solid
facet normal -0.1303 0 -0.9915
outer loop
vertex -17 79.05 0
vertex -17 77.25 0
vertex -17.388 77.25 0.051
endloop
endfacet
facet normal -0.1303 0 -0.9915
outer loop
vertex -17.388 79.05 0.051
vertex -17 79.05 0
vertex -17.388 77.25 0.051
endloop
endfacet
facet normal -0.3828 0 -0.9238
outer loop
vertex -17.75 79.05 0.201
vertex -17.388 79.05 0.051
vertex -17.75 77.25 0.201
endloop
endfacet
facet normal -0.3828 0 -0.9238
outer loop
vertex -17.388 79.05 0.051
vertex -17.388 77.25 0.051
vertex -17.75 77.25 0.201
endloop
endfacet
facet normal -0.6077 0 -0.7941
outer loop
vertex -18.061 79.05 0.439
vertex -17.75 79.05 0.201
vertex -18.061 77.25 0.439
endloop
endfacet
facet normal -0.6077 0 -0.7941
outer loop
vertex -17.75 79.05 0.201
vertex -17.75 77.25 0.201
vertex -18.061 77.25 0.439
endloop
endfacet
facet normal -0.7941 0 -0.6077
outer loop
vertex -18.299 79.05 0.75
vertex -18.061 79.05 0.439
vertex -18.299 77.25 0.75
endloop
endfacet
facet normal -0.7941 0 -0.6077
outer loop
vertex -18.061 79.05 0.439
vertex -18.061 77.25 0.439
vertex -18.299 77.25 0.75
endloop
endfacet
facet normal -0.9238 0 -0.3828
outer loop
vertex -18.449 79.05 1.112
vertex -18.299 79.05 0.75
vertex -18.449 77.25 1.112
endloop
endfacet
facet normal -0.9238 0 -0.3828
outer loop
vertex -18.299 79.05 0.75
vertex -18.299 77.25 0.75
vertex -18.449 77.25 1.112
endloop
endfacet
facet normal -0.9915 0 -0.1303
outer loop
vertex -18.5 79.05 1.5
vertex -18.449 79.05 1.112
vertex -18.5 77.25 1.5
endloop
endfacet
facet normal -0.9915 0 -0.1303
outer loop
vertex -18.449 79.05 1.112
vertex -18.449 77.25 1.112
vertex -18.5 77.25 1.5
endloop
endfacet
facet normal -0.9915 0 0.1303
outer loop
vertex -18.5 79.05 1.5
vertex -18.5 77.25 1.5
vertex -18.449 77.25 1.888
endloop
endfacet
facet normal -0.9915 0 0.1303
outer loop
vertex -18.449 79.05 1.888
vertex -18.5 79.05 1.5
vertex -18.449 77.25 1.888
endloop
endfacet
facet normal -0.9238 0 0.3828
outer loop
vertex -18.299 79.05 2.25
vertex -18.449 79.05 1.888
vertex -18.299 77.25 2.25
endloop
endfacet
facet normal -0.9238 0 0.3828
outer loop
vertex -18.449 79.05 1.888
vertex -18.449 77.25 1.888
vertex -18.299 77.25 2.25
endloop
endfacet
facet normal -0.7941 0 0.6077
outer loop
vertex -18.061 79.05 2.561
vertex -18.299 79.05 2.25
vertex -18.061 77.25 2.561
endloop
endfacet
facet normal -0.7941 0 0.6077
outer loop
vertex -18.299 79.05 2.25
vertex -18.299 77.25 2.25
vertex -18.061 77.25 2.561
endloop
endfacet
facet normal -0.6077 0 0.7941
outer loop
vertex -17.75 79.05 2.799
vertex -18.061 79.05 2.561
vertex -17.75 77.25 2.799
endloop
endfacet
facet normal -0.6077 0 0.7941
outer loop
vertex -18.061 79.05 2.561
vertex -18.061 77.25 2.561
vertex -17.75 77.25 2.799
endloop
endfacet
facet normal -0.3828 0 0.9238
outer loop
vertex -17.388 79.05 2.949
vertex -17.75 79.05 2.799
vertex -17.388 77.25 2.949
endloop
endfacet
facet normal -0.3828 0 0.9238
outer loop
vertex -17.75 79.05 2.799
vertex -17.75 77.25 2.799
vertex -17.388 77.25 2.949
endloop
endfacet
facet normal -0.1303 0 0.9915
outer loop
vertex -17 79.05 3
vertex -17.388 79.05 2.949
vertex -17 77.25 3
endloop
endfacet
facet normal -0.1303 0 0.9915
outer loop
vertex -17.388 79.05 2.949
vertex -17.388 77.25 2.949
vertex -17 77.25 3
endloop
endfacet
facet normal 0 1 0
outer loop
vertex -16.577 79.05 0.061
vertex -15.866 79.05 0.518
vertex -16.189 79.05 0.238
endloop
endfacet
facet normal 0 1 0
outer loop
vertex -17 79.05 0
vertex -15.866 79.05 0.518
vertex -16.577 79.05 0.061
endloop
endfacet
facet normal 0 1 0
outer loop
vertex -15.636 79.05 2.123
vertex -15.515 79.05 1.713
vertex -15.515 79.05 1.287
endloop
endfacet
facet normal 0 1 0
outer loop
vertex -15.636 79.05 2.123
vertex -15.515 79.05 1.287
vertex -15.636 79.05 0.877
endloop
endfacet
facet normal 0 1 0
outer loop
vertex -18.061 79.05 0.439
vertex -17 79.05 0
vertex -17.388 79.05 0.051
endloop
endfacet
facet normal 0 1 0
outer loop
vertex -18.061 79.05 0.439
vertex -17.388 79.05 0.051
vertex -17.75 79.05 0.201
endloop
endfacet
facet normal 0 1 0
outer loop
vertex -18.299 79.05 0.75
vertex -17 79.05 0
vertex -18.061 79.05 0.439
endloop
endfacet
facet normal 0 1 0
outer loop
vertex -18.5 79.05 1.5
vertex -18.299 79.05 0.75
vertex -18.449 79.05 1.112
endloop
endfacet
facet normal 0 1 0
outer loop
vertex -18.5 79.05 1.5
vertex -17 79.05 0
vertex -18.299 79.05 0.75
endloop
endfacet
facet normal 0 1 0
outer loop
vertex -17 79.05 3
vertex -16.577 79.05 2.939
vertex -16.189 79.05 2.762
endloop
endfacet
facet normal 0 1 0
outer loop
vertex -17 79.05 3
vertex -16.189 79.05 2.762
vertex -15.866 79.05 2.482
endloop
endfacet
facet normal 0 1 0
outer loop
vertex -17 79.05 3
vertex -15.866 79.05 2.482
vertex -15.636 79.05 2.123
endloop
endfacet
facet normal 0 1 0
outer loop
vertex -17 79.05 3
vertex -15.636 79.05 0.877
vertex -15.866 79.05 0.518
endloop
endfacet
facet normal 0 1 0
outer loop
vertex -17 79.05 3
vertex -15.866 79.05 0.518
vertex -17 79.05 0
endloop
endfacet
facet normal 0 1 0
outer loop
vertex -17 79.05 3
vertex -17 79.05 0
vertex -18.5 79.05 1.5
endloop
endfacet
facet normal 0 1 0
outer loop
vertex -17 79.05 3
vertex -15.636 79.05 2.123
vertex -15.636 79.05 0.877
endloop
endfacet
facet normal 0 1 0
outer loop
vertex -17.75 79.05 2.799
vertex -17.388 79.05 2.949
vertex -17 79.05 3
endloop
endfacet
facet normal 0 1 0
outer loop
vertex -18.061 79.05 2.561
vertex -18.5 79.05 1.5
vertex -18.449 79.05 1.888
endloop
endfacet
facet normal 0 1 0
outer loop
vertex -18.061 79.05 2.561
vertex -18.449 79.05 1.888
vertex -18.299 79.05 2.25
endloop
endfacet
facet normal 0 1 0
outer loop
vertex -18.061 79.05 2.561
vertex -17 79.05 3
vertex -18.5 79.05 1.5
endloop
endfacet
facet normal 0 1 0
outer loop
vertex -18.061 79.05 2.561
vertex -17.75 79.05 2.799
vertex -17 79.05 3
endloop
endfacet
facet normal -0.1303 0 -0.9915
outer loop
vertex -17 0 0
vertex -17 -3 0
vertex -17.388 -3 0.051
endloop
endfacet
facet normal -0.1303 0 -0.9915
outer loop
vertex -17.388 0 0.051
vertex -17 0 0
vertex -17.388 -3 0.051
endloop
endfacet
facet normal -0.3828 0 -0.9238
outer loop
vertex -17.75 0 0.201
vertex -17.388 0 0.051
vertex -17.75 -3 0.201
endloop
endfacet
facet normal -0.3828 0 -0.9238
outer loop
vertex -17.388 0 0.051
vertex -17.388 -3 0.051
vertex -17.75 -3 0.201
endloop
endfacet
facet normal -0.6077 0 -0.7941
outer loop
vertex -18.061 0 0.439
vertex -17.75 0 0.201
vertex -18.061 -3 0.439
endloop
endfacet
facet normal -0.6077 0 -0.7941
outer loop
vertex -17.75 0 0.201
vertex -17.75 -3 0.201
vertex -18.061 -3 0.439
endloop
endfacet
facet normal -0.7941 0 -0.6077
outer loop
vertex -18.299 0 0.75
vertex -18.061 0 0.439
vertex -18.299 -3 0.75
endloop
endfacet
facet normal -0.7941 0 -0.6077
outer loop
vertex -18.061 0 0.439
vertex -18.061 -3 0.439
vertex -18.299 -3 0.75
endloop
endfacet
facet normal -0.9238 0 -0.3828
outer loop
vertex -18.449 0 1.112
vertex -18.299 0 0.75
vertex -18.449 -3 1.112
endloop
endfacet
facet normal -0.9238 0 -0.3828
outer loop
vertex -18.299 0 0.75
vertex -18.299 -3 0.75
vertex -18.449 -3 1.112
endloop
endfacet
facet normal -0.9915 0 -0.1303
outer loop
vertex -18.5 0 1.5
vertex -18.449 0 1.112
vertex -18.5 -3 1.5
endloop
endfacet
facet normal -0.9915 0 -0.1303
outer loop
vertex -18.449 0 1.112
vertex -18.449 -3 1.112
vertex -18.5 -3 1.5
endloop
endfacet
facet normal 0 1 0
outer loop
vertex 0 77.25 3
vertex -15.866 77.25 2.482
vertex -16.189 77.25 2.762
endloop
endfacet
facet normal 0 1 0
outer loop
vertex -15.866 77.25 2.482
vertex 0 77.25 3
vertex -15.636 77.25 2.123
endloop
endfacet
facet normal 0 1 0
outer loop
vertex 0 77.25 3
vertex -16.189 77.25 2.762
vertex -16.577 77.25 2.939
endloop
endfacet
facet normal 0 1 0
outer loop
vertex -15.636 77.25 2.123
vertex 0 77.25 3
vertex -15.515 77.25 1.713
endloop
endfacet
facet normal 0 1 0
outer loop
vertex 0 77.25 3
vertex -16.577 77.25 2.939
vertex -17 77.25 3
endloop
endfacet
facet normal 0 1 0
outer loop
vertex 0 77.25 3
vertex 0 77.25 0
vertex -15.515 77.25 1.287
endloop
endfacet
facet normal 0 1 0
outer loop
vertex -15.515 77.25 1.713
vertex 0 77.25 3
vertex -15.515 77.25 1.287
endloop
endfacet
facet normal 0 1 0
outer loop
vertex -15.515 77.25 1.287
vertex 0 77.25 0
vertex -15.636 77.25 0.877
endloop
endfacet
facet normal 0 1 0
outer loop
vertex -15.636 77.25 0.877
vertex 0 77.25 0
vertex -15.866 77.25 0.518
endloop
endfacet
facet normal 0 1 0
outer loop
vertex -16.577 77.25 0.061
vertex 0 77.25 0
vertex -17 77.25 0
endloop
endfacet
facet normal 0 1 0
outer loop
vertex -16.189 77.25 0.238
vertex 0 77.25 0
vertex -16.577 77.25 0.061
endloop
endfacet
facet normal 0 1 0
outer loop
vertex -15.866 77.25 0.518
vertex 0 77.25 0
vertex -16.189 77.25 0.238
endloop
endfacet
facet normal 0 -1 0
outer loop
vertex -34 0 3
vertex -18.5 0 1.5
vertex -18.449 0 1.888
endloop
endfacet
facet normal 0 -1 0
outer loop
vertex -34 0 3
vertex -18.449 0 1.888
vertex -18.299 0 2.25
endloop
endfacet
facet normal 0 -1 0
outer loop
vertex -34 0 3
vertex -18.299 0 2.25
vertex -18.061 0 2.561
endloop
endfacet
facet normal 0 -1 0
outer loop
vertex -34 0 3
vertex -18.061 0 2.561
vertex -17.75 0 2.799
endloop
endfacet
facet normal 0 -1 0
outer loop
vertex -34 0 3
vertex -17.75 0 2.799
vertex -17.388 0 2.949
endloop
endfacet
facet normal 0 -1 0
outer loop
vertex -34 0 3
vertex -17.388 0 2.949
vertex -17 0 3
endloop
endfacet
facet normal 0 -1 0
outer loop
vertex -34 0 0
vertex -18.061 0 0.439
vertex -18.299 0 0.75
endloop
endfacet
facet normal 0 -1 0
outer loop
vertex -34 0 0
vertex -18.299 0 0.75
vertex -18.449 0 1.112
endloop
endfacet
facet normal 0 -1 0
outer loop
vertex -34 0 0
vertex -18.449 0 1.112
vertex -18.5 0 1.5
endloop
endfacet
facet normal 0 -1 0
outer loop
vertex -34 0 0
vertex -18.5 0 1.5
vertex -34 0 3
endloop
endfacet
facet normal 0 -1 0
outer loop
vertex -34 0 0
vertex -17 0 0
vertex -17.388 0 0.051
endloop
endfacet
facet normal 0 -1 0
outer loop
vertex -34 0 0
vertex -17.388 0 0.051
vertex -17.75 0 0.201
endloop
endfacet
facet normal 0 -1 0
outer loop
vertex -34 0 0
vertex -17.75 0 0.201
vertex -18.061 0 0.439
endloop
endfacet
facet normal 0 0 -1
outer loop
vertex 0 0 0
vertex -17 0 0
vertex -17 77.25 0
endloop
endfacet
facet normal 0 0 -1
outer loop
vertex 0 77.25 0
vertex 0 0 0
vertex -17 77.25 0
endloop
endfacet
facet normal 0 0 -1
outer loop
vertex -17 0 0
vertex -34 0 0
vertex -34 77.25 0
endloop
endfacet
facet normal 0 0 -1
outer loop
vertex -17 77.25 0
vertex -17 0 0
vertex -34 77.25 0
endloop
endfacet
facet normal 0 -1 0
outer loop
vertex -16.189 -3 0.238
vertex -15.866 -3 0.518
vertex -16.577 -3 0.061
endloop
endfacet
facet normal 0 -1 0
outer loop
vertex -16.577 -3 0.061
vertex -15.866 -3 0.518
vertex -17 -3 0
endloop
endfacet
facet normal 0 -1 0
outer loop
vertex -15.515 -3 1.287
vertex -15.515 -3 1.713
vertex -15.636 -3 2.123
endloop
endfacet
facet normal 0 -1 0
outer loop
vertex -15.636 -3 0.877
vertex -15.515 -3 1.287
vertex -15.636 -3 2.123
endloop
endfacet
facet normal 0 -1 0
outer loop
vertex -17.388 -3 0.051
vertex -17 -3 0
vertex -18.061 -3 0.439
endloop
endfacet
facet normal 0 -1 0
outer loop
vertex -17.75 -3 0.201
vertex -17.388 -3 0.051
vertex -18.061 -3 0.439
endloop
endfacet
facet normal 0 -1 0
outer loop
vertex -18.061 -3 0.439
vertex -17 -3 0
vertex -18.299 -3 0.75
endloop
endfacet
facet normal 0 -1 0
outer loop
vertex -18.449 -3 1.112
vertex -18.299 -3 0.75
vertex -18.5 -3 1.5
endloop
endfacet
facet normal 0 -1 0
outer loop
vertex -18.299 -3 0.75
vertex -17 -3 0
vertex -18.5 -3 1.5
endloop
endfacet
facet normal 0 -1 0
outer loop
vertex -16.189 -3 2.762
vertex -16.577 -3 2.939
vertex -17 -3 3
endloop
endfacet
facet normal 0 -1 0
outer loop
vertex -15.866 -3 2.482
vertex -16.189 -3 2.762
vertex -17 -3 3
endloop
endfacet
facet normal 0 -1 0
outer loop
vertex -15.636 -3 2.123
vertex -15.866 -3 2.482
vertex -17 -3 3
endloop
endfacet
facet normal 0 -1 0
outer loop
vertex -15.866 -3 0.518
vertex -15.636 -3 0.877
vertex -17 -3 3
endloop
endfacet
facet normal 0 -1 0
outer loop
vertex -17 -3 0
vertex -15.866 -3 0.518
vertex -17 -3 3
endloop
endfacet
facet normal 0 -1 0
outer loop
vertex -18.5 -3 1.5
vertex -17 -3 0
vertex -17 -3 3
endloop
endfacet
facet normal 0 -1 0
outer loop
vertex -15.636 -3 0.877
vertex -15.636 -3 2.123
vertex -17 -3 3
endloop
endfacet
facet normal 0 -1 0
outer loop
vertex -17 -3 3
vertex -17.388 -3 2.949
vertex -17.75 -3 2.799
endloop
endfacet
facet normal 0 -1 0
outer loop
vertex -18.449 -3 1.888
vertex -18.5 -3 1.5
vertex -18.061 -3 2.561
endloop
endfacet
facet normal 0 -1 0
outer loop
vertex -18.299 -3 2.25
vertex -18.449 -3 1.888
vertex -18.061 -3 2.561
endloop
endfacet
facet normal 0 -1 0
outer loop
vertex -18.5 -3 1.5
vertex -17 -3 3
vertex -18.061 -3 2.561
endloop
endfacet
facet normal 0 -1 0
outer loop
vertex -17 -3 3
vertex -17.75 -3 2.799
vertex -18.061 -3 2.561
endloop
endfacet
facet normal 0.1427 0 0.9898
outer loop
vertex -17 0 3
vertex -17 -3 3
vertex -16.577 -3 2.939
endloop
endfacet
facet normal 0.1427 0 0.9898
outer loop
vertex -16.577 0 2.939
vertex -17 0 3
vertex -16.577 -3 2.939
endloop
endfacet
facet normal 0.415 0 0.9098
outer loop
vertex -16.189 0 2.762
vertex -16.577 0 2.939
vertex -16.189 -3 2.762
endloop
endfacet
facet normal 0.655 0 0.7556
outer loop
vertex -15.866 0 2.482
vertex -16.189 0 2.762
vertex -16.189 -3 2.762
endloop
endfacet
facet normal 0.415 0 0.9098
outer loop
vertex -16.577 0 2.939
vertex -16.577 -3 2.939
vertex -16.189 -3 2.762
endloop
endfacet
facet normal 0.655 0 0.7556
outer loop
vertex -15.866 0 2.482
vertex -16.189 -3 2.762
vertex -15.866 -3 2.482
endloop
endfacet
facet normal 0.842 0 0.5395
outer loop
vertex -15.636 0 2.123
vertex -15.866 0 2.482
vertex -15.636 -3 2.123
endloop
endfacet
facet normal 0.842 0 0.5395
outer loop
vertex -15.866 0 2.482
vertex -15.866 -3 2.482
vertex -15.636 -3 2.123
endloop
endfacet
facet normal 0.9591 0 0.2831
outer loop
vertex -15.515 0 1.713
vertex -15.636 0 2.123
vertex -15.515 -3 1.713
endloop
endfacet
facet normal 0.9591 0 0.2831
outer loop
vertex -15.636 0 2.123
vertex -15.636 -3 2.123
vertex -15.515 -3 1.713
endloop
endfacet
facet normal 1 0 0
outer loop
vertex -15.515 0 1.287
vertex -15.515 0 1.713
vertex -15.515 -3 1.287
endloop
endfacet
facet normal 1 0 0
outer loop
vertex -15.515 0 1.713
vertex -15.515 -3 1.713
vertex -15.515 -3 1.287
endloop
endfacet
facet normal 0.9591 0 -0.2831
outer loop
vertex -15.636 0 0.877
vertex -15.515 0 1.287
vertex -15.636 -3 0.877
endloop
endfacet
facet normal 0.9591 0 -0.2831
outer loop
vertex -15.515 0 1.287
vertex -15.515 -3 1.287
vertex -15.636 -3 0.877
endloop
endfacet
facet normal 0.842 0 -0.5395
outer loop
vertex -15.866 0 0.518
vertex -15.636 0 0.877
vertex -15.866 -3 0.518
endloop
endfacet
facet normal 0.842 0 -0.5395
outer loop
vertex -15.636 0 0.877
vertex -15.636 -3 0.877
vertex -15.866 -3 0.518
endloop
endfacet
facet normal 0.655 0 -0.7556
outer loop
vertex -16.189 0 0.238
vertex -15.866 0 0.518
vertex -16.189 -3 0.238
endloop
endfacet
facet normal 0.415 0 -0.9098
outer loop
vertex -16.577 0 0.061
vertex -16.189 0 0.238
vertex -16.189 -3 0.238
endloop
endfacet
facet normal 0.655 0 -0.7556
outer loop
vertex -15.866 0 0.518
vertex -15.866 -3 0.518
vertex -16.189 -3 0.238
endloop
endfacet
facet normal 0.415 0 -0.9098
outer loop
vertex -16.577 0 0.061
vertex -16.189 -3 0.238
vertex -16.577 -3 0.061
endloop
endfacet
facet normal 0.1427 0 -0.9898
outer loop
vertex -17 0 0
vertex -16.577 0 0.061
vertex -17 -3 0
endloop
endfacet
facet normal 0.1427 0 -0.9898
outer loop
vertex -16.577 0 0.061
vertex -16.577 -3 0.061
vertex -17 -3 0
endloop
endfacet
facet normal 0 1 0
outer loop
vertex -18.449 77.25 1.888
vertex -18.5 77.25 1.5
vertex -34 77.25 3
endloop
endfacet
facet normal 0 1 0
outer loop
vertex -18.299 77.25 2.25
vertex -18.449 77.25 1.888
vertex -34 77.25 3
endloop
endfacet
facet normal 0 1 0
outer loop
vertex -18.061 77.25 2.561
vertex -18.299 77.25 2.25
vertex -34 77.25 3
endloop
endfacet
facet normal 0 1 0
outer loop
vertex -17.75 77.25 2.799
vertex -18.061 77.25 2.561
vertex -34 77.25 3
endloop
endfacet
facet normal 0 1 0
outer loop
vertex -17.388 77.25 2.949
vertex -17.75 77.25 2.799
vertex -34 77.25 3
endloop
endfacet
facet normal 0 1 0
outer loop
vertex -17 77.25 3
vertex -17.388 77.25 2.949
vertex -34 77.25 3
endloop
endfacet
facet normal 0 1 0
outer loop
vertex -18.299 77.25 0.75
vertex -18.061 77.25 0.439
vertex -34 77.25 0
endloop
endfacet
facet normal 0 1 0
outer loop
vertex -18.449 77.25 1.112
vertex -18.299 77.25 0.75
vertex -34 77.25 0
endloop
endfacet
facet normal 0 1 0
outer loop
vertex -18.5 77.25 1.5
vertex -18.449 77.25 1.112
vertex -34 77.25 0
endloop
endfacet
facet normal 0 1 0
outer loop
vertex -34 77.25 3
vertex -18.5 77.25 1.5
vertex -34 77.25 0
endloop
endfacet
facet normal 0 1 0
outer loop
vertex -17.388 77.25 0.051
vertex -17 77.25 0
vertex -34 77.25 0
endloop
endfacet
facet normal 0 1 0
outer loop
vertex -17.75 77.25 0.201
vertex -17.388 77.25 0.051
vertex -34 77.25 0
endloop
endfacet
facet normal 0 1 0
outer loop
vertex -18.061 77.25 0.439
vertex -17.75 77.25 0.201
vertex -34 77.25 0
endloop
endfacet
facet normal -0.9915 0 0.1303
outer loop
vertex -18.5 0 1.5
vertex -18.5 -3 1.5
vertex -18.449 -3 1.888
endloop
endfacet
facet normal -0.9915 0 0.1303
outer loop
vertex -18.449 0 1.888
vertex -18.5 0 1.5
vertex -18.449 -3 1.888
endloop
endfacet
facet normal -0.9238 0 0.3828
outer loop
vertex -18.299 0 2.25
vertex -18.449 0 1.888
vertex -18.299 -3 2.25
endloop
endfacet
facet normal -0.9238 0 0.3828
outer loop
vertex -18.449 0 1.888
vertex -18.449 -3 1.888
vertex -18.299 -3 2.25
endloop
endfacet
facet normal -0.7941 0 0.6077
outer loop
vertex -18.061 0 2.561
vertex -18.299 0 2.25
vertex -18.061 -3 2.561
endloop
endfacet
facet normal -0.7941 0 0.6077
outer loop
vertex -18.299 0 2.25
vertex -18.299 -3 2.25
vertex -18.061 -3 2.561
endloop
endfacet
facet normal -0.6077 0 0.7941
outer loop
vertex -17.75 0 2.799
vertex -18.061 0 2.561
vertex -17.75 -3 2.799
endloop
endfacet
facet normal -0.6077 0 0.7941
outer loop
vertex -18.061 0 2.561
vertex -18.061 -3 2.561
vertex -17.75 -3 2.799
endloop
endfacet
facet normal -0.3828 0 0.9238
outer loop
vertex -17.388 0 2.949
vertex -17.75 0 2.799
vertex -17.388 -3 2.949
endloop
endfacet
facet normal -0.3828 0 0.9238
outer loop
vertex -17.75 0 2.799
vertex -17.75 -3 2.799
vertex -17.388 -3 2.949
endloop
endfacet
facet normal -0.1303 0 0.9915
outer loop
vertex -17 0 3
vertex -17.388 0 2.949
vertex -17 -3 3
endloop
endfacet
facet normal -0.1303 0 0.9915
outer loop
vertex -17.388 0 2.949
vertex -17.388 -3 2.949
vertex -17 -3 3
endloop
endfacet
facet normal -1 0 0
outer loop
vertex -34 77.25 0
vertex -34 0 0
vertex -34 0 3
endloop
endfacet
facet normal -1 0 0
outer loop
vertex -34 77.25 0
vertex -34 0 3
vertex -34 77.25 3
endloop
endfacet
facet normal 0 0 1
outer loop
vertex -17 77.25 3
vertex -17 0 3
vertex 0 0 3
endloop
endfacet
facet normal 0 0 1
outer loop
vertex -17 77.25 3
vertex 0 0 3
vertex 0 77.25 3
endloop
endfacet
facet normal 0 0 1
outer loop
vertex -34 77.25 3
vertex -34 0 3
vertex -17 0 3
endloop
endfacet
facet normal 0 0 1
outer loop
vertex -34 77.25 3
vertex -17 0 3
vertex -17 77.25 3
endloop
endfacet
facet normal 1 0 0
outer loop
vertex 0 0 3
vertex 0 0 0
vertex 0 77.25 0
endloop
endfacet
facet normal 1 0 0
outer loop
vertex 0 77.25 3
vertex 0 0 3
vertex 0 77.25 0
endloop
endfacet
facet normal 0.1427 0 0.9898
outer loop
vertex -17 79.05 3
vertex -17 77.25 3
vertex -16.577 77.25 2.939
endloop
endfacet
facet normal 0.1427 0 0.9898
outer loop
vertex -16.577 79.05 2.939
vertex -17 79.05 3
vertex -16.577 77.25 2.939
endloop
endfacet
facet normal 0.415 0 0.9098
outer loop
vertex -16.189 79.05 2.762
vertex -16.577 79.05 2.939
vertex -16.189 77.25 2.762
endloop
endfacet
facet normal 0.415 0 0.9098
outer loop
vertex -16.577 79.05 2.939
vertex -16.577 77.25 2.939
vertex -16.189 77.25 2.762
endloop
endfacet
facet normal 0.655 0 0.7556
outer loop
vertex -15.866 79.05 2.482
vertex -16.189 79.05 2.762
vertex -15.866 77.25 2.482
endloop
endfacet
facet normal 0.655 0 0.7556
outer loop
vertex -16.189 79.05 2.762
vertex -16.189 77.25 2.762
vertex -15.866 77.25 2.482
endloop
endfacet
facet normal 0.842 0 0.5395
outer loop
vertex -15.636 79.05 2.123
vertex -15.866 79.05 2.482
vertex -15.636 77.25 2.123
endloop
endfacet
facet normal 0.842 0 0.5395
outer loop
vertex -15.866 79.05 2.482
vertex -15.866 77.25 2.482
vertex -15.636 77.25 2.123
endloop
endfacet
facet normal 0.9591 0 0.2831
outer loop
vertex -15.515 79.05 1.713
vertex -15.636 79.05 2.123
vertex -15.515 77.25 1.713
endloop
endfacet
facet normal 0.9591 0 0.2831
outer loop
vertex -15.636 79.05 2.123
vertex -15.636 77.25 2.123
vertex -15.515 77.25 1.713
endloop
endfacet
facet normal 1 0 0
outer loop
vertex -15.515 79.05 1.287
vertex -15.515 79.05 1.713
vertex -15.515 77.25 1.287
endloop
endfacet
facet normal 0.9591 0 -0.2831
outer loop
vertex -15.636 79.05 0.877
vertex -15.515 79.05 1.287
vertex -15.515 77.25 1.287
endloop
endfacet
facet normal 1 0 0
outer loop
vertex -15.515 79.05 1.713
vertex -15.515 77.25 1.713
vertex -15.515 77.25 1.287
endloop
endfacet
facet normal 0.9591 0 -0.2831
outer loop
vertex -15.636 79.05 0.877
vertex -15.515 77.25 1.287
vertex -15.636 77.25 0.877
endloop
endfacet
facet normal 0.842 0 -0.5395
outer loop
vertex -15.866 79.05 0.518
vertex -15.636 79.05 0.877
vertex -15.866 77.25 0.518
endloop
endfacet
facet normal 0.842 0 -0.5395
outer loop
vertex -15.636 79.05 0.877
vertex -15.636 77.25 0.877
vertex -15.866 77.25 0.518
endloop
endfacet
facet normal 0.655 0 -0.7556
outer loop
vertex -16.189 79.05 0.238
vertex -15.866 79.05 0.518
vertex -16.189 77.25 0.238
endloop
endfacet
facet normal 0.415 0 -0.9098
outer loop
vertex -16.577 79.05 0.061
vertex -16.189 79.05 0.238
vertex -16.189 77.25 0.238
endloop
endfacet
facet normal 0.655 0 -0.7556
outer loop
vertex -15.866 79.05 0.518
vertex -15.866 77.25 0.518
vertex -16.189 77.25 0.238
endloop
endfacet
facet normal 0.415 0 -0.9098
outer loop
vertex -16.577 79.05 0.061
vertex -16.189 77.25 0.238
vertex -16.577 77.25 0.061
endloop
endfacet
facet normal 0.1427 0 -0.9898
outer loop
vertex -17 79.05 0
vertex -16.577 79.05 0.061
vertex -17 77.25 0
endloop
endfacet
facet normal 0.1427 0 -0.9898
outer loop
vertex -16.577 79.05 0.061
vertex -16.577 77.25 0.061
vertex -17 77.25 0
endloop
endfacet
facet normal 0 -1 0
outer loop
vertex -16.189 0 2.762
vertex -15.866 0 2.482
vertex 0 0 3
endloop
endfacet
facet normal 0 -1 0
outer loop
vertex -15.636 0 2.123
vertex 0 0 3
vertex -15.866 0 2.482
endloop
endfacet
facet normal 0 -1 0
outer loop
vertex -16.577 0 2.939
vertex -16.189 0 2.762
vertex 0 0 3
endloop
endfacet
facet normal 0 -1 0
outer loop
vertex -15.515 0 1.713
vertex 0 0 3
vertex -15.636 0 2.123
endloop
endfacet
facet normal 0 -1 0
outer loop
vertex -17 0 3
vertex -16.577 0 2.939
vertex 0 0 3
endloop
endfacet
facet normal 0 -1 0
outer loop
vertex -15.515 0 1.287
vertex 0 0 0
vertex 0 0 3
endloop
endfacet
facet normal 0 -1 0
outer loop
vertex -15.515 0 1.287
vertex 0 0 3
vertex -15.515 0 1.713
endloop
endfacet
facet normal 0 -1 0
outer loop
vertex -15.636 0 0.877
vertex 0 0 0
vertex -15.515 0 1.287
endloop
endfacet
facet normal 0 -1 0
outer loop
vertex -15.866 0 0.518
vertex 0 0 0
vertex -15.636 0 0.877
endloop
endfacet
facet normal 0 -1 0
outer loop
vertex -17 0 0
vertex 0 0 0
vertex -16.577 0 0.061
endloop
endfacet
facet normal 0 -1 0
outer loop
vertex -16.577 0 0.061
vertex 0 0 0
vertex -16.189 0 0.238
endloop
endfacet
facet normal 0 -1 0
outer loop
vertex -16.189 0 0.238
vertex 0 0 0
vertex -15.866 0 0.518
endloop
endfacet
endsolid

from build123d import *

# Parameters (mm, degrees)
SKETCH1_W           = 77.25
SKETCH1_H           = 34
BOSS_EXTRUDE1_DEPTH = 3
BOSS_EXTRUDE2_DEPTH = 1.8
BOSS_EXTRUDE3_START = -80.25
BOSS_EXTRUDE3_DEPTH = 3


with BuildPart() as part:
    # Sketch1 → Boss-Extrude1 (new body)
    with BuildSketch(Plane(origin=(0, 0, 0), x_dir=(0, 1, 0), z_dir=(0, 0, 1))):
        with Locations((38.625, 17)):
            Rectangle(SKETCH1_W, SKETCH1_H)
    extrude(amount=BOSS_EXTRUDE1_DEPTH)

    # Sketch2 → Boss-Extrude2 (add)
    with BuildSketch(Plane(origin=(0, 77.25, 0), x_dir=(-1, 0, 0), z_dir=(0, 1, 0))):
        with BuildLine():
            ThreePointArc((18.5, 1.5), (18.060660172, 2.560660172), (17, 3))
            Line((17, 3), (17, 0))
            ThreePointArc((17, 0), (18.060660172, 0.439339828), (18.5, 1.5))
        make_face()
        with BuildLine():
            Line((17, 0), (17, 3))
            ThreePointArc((17, 3), (15.5, 1.5), (17, 0))
        make_face()
    extrude(amount=BOSS_EXTRUDE2_DEPTH)

    # Sketch2<4> → Boss-Extrude3 (add)
    with BuildSketch(Plane(origin=(0, 77.25, 0), x_dir=(-1, 0, 0), z_dir=(0, 1, 0)).offset(BOSS_EXTRUDE3_START)):
        with BuildLine():
            ThreePointArc((18.5, 1.5), (18.060660172, 2.560660172), (17, 3))
            Line((17, 3), (17, 0))
            ThreePointArc((17, 0), (18.060660172, 0.439339828), (18.5, 1.5))
        make_face()
        with BuildLine():
            Line((17, 0), (17, 3))
            ThreePointArc((17, 3), (15.5, 1.5), (17, 0))
        make_face()
    extrude(amount=BOSS_EXTRUDE3_DEPTH)


solid = part.part
